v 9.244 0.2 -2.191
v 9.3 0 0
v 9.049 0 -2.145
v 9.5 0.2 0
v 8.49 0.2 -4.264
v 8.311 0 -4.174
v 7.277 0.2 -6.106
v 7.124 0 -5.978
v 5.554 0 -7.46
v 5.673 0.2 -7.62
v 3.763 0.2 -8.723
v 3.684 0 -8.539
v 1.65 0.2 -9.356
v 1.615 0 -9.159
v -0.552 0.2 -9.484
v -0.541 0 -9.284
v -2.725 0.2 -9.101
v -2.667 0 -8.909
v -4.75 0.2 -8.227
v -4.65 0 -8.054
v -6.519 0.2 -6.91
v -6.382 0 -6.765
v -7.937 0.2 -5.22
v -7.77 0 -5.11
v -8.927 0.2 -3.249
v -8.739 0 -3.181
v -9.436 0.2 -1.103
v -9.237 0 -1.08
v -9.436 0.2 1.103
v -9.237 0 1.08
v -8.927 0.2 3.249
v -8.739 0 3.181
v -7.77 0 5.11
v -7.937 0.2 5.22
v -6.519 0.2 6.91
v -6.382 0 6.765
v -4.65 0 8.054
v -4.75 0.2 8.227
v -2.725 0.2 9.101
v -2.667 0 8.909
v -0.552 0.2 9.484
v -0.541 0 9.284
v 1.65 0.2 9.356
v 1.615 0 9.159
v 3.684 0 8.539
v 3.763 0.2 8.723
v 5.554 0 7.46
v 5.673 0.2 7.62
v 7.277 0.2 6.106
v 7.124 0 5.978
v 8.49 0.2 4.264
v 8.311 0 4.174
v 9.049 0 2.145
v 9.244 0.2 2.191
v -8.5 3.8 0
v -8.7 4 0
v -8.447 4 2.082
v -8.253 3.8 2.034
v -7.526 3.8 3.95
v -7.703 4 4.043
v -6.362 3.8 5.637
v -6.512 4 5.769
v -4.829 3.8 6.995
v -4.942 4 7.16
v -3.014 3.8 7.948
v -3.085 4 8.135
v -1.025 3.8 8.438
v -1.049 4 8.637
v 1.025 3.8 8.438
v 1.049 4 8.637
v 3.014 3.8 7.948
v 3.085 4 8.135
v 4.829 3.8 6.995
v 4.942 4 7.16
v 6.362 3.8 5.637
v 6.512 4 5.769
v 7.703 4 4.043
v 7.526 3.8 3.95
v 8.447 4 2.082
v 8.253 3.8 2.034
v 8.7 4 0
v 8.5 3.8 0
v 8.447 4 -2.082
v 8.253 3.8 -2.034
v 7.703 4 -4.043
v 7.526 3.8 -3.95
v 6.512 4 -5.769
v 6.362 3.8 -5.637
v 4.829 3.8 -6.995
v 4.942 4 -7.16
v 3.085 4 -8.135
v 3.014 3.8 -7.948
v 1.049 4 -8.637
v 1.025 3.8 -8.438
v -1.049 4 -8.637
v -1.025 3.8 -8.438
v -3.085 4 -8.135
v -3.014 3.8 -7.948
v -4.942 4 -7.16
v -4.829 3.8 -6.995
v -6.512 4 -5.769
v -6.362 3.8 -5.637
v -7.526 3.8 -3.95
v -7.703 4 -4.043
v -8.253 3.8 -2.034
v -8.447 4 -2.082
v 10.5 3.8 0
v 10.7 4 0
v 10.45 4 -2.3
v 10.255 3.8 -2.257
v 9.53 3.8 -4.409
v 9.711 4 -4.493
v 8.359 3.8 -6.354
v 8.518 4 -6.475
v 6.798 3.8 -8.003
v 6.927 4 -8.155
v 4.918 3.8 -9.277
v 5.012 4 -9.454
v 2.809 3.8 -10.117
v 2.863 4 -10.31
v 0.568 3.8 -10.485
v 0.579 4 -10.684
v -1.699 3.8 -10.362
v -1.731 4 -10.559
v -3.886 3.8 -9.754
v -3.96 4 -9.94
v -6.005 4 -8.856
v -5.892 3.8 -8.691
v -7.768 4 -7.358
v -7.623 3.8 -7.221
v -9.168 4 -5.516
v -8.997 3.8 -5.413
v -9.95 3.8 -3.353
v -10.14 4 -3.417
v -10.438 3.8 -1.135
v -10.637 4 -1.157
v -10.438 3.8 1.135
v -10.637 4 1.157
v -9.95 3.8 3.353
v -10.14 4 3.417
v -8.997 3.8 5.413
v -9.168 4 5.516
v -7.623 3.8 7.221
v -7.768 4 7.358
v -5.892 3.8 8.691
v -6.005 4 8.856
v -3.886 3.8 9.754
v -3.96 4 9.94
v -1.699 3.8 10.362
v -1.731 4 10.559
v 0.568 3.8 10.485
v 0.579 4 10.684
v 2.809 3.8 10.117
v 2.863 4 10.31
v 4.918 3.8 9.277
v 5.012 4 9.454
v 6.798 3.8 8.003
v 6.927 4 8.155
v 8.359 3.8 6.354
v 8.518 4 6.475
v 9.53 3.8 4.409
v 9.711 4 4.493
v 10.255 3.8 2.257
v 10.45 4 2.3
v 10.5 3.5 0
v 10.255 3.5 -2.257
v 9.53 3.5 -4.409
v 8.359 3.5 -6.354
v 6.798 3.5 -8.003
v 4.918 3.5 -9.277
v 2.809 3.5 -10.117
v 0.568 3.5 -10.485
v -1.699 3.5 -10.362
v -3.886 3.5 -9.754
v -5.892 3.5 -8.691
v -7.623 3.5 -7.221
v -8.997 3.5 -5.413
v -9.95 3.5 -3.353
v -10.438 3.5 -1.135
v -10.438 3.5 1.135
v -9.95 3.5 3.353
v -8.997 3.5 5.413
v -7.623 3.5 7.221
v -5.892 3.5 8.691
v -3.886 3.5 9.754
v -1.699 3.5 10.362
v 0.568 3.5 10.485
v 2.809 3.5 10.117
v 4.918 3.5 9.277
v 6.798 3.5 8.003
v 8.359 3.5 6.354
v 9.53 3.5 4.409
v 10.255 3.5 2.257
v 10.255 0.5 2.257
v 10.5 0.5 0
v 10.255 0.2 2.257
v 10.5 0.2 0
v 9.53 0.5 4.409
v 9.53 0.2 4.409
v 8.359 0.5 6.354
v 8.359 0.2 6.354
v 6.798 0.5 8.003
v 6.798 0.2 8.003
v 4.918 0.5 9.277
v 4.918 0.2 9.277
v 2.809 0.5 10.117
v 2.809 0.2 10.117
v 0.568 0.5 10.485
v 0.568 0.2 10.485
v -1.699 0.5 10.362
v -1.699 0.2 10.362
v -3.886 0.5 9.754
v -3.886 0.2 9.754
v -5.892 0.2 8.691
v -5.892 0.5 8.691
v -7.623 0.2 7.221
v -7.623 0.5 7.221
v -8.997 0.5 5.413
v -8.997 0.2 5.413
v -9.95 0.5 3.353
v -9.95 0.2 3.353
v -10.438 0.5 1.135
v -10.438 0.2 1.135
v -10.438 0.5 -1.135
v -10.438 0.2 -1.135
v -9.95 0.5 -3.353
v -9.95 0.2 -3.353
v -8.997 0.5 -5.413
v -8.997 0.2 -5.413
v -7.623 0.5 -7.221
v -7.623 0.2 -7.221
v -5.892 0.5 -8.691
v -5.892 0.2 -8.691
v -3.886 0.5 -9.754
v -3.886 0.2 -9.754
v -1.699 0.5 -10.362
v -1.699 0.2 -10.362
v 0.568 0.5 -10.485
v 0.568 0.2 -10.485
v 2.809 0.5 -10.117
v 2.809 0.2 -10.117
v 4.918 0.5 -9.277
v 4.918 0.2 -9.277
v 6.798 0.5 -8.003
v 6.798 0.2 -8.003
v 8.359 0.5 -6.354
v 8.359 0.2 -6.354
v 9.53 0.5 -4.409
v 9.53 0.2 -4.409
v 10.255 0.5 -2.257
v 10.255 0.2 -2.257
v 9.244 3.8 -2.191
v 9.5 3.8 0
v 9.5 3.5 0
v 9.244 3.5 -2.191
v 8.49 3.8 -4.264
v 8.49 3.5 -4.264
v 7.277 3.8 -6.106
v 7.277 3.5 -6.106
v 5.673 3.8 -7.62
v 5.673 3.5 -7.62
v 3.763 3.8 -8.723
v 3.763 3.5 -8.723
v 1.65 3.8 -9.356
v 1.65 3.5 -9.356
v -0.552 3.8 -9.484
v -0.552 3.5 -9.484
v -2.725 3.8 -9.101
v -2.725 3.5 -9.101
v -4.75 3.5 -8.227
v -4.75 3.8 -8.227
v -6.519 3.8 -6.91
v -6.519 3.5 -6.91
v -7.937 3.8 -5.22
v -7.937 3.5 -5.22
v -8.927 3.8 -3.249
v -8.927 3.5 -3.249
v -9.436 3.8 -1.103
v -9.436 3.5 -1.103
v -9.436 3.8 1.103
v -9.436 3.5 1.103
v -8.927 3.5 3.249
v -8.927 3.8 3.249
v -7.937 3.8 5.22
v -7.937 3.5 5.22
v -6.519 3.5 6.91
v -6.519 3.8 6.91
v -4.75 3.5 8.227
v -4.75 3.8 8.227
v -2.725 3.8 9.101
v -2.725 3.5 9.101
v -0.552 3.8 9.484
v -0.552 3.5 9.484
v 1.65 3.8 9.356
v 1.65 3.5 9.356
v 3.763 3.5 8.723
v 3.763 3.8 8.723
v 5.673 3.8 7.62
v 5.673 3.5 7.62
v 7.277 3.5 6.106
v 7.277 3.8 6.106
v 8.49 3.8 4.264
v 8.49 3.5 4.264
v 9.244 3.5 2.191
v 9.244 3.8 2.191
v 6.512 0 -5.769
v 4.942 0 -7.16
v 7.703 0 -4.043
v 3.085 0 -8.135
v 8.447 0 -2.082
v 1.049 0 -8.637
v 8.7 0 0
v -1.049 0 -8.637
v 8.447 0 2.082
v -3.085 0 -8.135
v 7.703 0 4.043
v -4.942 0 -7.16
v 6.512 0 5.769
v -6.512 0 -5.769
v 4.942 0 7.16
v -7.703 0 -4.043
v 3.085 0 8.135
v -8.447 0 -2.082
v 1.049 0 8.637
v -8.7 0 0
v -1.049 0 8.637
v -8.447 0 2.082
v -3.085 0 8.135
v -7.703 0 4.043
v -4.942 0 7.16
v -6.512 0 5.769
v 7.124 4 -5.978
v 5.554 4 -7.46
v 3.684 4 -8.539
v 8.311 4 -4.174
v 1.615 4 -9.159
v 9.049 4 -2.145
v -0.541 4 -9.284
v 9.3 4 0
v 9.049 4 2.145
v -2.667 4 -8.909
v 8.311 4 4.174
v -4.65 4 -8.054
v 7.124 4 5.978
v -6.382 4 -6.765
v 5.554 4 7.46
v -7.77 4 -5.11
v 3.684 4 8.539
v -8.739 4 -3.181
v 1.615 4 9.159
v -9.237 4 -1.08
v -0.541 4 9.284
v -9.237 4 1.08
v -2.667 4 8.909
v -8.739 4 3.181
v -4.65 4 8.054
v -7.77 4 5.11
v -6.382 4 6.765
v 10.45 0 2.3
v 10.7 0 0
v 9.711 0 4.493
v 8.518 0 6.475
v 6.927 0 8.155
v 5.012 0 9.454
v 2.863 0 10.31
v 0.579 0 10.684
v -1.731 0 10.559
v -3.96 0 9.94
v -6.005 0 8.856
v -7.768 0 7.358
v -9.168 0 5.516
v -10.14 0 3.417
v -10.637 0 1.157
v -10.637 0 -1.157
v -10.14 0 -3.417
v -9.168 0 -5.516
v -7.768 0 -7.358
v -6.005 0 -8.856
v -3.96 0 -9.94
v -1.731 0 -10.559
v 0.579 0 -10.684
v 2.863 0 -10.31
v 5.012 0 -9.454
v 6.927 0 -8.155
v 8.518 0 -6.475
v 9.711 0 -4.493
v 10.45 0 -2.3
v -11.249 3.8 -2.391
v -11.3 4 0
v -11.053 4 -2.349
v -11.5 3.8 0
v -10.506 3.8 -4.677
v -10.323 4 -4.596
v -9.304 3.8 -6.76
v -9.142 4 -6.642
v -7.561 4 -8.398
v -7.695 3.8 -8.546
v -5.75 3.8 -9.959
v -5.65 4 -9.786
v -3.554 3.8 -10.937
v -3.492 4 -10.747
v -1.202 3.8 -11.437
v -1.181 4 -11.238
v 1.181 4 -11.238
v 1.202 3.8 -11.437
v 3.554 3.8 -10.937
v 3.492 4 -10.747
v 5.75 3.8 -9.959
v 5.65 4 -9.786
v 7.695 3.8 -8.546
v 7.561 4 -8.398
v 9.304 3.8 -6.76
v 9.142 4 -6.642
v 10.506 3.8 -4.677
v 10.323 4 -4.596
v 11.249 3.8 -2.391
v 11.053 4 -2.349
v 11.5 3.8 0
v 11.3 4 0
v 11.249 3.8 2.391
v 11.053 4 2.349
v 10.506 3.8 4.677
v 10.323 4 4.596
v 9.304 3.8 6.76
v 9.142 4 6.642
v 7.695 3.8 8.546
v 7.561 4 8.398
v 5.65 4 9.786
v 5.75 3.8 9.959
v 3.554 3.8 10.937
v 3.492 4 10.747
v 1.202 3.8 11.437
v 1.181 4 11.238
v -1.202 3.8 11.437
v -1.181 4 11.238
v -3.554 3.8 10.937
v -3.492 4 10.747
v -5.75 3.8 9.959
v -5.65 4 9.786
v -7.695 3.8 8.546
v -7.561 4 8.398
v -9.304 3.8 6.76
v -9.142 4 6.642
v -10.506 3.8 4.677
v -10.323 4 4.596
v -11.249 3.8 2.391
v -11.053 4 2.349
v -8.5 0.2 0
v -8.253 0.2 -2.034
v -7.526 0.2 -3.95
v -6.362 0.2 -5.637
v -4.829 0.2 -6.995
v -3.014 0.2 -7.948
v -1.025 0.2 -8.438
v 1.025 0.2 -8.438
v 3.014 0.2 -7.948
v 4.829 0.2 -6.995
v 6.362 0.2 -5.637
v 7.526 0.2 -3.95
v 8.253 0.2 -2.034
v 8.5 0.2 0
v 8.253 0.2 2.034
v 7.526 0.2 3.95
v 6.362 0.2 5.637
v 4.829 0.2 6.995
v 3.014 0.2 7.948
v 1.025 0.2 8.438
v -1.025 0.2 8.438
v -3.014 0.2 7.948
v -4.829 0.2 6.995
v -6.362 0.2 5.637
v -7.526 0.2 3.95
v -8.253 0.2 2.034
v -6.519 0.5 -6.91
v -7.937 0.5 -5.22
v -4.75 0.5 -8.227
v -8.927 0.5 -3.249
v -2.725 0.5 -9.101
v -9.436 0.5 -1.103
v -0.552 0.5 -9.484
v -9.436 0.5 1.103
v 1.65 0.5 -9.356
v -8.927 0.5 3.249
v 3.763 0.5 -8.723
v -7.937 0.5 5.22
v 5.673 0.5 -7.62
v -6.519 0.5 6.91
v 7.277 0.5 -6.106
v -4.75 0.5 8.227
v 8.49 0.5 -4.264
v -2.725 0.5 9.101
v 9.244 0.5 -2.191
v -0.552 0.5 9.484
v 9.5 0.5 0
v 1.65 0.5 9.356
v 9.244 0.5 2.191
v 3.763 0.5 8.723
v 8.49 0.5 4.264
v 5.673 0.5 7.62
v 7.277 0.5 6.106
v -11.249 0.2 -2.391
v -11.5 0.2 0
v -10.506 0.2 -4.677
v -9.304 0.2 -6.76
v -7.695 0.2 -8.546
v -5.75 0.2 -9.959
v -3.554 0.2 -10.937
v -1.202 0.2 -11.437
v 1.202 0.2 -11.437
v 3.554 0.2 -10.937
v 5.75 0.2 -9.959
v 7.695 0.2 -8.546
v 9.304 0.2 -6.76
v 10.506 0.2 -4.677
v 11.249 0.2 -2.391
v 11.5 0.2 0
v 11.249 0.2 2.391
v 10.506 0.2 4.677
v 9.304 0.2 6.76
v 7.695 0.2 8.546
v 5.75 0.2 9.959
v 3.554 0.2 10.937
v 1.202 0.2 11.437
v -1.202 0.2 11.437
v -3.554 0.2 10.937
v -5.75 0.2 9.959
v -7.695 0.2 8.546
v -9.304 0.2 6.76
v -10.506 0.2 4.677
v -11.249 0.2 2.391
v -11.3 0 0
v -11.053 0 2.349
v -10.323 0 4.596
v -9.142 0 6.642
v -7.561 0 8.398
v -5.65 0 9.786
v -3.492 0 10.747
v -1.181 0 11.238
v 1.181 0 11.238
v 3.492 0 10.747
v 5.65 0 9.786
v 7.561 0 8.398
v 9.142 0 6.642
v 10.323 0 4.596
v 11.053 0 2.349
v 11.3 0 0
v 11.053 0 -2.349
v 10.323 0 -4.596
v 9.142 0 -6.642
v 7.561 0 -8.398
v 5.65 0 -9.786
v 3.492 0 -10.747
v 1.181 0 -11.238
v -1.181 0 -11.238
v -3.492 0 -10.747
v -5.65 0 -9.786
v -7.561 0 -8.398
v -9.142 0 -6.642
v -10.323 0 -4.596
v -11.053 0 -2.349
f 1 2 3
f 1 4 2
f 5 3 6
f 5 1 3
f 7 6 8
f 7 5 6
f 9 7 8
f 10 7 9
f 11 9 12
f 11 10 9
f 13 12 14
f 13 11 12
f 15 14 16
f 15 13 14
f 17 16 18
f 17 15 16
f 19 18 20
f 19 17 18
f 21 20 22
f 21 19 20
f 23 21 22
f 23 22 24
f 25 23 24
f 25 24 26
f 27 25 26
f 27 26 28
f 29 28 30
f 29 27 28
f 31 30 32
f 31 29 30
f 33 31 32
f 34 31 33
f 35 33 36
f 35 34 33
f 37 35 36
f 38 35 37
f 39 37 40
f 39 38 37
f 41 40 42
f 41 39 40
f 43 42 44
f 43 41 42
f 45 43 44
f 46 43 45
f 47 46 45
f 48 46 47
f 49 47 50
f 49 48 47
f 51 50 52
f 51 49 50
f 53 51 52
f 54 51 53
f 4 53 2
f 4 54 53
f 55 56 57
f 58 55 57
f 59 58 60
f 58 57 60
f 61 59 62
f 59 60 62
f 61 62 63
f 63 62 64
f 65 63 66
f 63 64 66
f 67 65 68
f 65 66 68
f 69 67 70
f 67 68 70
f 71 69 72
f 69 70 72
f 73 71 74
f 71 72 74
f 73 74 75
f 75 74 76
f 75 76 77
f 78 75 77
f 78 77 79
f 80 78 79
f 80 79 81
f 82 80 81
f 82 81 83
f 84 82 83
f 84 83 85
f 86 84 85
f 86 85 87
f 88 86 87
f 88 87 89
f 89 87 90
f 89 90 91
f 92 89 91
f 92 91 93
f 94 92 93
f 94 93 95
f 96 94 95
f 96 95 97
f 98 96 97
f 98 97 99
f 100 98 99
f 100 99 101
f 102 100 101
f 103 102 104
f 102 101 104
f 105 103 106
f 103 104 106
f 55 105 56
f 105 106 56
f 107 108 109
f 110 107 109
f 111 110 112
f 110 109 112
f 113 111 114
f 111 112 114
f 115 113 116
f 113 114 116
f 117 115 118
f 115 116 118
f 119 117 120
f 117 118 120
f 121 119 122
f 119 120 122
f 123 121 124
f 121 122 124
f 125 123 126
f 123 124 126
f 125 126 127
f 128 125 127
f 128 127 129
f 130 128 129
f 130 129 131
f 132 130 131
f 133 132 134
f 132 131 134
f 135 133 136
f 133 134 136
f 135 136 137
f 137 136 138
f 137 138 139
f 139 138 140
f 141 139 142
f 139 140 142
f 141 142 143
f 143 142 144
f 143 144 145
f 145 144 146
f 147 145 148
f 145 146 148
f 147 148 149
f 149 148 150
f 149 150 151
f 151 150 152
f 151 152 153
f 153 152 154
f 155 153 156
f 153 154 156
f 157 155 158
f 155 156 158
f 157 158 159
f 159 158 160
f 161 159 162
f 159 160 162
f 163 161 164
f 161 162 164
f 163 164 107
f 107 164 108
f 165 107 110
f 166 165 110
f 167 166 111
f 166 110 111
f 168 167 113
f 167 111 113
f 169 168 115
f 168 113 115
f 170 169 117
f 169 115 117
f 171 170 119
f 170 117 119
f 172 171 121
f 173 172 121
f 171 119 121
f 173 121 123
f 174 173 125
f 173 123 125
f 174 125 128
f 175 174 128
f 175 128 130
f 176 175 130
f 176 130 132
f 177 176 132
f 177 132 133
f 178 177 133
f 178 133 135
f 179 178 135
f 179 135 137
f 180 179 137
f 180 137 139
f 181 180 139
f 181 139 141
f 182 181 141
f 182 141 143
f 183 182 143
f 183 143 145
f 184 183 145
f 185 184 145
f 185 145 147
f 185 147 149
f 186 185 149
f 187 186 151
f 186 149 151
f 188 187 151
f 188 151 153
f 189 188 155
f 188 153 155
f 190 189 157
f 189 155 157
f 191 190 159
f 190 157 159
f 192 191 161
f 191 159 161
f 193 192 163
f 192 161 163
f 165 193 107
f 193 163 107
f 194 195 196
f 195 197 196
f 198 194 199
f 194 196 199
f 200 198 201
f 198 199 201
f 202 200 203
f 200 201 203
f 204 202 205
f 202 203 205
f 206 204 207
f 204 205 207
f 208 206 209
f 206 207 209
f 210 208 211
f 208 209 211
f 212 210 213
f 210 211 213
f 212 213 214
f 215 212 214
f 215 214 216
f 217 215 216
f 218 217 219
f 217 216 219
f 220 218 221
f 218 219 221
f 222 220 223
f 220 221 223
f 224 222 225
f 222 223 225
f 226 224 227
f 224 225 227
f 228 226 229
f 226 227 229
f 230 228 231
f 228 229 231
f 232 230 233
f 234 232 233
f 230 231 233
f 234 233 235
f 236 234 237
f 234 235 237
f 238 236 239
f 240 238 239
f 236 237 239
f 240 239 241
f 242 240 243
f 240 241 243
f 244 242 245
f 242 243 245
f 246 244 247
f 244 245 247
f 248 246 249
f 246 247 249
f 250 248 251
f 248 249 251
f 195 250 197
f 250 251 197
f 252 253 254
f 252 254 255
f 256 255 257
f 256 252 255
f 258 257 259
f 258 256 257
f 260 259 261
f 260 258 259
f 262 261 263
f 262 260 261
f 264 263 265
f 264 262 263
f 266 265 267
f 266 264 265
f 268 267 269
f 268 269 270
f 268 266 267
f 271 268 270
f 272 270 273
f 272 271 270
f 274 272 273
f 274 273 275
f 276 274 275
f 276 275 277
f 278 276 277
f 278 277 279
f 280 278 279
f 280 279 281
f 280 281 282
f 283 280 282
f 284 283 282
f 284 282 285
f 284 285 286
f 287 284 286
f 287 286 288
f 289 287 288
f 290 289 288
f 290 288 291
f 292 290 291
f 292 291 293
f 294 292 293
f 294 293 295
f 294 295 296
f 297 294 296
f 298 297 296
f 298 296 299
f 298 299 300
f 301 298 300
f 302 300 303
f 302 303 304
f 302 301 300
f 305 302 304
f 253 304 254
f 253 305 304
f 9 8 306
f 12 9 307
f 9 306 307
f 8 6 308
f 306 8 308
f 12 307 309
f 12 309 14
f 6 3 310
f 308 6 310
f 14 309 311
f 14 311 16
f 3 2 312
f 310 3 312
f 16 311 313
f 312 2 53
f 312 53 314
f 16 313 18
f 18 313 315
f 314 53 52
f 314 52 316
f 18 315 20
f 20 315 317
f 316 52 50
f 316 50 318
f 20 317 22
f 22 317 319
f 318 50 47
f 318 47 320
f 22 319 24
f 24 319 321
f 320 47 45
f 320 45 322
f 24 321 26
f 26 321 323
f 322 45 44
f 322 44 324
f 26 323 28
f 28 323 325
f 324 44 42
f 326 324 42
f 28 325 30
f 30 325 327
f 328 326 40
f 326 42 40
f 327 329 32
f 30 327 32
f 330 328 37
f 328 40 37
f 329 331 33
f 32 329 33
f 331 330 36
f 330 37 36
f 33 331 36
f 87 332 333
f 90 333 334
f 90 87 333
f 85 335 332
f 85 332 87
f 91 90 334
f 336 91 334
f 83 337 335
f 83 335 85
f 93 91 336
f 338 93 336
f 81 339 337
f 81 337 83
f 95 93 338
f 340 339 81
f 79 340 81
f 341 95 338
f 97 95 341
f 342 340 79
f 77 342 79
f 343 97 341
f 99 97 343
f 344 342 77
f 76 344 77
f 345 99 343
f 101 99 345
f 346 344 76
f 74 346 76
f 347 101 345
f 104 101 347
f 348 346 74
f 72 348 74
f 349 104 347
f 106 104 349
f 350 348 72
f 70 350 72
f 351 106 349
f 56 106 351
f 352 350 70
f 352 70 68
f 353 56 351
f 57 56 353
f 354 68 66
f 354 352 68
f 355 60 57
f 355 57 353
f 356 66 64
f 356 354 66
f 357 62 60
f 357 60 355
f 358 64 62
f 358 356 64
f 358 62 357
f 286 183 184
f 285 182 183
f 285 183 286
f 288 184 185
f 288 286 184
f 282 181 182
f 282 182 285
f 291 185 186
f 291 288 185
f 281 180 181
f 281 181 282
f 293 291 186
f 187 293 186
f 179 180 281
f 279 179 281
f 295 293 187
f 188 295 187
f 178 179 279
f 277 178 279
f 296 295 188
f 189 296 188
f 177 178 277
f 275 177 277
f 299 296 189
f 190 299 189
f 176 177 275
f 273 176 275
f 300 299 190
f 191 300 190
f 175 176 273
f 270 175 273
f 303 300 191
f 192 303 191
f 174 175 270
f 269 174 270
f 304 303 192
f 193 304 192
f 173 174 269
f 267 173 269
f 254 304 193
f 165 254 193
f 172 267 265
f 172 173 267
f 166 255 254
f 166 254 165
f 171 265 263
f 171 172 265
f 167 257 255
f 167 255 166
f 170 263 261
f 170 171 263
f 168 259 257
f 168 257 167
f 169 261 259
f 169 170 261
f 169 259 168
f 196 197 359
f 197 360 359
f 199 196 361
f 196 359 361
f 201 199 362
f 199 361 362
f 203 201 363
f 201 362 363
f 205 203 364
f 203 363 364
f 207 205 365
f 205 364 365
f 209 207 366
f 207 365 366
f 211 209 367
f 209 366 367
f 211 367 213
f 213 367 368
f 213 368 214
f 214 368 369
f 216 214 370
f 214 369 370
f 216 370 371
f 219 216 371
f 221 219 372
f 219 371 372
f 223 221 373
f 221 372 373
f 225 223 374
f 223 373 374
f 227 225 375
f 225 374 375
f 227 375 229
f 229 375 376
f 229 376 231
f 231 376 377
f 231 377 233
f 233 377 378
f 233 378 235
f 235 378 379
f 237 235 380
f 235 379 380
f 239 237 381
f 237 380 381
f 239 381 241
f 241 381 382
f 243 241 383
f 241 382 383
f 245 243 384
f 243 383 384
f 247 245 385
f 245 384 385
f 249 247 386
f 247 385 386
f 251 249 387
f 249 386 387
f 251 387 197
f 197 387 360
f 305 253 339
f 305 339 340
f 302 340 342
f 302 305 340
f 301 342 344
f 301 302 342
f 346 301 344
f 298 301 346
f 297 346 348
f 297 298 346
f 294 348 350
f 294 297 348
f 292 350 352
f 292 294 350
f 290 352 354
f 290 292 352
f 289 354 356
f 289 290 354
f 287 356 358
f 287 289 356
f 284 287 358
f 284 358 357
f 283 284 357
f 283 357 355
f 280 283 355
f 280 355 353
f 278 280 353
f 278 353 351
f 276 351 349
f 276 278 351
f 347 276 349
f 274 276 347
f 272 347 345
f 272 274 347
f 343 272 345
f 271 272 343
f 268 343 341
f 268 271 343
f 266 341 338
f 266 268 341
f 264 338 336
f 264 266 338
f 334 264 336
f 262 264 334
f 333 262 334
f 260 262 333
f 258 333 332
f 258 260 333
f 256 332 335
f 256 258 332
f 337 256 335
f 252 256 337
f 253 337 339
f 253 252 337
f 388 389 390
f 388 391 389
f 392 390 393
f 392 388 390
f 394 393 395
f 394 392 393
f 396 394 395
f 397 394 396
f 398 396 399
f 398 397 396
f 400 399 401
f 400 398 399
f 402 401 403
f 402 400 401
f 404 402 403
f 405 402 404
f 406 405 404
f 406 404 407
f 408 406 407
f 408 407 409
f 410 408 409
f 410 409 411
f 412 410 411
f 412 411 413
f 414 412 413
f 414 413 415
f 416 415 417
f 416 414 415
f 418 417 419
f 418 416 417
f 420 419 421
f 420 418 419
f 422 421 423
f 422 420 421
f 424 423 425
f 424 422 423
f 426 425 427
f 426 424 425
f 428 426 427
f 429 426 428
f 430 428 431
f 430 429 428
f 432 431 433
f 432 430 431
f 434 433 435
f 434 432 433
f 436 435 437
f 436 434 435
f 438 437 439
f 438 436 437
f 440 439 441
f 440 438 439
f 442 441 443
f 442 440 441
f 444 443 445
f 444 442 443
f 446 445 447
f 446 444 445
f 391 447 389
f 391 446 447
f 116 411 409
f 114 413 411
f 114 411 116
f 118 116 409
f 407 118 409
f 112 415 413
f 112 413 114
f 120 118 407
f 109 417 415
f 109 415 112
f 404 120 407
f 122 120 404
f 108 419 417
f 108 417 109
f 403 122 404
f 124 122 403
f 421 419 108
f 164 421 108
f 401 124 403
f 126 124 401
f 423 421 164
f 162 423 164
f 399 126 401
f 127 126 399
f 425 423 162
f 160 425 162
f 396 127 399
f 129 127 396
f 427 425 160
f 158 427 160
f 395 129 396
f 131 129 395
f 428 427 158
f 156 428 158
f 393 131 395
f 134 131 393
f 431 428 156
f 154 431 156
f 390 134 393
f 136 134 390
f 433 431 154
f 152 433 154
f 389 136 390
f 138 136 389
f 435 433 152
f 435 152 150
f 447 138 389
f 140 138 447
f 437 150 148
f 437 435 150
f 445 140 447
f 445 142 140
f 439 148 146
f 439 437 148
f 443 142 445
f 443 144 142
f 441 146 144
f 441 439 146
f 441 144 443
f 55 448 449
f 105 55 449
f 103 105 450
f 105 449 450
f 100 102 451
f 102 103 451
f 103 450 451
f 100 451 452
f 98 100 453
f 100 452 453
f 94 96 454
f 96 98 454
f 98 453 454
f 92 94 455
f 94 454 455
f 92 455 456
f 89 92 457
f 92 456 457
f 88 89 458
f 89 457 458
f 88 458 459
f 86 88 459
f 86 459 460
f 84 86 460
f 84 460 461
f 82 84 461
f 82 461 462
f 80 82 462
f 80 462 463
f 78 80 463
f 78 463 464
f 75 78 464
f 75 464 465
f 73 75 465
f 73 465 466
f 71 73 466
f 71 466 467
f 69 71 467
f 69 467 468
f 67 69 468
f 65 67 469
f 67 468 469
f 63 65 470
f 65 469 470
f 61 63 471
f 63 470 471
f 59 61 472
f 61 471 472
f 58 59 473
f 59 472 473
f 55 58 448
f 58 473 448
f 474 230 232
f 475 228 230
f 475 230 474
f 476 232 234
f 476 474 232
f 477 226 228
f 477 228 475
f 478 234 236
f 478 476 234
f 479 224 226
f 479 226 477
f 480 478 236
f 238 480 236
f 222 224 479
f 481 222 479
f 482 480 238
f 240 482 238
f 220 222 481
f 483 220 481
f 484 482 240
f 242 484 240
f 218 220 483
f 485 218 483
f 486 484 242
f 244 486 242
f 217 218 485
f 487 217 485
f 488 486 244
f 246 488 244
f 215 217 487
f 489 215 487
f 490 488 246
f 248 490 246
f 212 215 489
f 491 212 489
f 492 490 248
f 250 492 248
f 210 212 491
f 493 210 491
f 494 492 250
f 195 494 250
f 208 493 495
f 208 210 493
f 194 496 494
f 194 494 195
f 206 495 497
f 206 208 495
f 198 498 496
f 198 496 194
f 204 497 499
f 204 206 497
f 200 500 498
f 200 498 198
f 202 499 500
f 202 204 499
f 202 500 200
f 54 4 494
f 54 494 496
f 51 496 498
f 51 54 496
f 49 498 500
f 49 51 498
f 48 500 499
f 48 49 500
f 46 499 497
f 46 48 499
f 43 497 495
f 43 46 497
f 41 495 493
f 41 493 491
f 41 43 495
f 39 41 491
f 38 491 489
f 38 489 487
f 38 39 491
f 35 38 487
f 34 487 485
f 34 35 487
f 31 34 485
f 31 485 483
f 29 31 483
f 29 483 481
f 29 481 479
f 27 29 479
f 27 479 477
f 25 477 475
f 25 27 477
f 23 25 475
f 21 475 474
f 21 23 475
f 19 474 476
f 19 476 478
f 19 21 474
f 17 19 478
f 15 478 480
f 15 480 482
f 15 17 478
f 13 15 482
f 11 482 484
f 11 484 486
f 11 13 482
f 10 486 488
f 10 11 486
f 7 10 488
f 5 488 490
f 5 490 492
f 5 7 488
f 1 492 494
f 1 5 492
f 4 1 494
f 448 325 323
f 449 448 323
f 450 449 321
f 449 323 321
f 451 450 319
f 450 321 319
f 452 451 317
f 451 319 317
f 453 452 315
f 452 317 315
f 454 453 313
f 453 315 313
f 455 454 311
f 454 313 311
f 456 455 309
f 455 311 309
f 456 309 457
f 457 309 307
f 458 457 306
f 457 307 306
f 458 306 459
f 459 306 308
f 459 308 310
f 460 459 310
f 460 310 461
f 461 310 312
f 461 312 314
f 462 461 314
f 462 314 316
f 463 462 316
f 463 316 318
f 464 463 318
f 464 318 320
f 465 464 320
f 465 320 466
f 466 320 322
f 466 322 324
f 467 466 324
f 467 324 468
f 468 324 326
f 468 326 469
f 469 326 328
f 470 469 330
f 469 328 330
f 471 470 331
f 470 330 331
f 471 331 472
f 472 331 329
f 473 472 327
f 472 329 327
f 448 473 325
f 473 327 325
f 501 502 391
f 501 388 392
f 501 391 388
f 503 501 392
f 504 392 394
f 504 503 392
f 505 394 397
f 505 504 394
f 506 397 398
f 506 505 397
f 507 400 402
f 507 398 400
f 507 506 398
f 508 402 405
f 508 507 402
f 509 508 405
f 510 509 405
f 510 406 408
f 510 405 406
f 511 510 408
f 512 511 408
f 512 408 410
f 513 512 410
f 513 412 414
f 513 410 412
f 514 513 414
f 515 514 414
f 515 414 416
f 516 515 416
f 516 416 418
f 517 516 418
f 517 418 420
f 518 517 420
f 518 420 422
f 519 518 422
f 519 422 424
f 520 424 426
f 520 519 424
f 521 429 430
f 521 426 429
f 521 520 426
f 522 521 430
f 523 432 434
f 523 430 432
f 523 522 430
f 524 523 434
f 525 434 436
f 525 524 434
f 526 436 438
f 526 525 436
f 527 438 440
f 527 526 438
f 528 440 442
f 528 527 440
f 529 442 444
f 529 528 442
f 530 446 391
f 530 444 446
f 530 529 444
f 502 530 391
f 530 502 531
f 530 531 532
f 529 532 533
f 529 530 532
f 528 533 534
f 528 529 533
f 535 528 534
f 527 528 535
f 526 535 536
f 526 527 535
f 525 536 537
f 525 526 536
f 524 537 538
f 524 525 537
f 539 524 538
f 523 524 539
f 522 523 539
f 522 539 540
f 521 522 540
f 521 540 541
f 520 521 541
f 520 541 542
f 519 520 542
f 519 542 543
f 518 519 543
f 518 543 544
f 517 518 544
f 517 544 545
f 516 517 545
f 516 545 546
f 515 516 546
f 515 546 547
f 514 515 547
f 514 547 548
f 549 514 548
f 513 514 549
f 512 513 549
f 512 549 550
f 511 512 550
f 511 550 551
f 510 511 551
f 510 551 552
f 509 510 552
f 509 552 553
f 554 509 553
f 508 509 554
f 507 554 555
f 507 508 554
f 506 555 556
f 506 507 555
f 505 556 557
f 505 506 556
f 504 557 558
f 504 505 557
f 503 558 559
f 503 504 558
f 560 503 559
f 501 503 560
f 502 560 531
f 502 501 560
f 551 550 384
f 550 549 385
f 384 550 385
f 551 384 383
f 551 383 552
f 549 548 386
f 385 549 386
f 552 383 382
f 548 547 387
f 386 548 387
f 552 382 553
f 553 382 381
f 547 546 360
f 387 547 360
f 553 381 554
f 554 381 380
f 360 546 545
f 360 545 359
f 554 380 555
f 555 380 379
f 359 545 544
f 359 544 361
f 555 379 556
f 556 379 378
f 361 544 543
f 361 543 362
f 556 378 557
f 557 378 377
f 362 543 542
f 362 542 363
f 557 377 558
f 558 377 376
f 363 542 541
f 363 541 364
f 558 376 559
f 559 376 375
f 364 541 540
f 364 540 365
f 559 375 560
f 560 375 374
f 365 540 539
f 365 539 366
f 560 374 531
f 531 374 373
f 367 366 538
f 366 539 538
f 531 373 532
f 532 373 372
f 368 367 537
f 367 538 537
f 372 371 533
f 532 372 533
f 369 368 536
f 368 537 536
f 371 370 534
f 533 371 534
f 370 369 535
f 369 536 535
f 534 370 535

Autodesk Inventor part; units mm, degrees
ref_plane "YZ Plane" through (0, 0, 0) normal (1, 0, 0) x (0, 1, 0)
ref_plane "XZ Plane" through (0, 0, 0) normal (0, 1, 0) x (-1, 0, 0)
ref_plane "XY Plane" through (0, 0, 0) normal (0, 0, 1) x (1, 0, 0)
sketch "Эскиз1" plane through (0, 0, 0) normal (0, 1, 0) x (-1, 0, 0)
  circle A0 centre (0, 0) radius 11.5
  circle A1 centre (0, 0) radius 8.5
  dimension "d0" = 23
  dimension "d1" = 17
extrude "Выдавливание1" add sketch "Эскиз1" along normal blind 4
sketch "Эскиз2" plane through (0, 4, 0) normal (0, 1, 0) x (1, 0, 0)
  circle A0 centre (0, 0) radius 9.5
  circle A1 centre (0, 0) radius 10.5
  circle A2 centre (0, 0) radius 11.5 projected
  circle A3 centre (0, 0) radius 8.5 projected
  dimension "d4" = 1
  dimension "d5" = 1
extrude "Выдавливание2" cut sketch "Эскиз2" against normal blind 0.5 contours A1
sketch "Эскиз3" plane through (0, 0, 0) normal (0, -1, 0) x (1, 0, 0)
  circle A0 centre (0, 0) radius 9.5 projected
  circle A1 centre (0, 0) radius 10.5 projected
extrude "Выдавливание3" cut sketch "Эскиз3" against normal blind 0.5
chamfer "Фаска1" distance 0.2 angle 45 8 edges at (-9.5, 0, 0) (8.5, 0, 0) (-10.5, 0, 0) (11.5, 0, 0) (11.5, 4, 0) (-10.5, 4, 0) (-9.5, 4, 0) (8.5, 4, 0)
properties part number "Подшипник 17x23x4" material "Титан"
